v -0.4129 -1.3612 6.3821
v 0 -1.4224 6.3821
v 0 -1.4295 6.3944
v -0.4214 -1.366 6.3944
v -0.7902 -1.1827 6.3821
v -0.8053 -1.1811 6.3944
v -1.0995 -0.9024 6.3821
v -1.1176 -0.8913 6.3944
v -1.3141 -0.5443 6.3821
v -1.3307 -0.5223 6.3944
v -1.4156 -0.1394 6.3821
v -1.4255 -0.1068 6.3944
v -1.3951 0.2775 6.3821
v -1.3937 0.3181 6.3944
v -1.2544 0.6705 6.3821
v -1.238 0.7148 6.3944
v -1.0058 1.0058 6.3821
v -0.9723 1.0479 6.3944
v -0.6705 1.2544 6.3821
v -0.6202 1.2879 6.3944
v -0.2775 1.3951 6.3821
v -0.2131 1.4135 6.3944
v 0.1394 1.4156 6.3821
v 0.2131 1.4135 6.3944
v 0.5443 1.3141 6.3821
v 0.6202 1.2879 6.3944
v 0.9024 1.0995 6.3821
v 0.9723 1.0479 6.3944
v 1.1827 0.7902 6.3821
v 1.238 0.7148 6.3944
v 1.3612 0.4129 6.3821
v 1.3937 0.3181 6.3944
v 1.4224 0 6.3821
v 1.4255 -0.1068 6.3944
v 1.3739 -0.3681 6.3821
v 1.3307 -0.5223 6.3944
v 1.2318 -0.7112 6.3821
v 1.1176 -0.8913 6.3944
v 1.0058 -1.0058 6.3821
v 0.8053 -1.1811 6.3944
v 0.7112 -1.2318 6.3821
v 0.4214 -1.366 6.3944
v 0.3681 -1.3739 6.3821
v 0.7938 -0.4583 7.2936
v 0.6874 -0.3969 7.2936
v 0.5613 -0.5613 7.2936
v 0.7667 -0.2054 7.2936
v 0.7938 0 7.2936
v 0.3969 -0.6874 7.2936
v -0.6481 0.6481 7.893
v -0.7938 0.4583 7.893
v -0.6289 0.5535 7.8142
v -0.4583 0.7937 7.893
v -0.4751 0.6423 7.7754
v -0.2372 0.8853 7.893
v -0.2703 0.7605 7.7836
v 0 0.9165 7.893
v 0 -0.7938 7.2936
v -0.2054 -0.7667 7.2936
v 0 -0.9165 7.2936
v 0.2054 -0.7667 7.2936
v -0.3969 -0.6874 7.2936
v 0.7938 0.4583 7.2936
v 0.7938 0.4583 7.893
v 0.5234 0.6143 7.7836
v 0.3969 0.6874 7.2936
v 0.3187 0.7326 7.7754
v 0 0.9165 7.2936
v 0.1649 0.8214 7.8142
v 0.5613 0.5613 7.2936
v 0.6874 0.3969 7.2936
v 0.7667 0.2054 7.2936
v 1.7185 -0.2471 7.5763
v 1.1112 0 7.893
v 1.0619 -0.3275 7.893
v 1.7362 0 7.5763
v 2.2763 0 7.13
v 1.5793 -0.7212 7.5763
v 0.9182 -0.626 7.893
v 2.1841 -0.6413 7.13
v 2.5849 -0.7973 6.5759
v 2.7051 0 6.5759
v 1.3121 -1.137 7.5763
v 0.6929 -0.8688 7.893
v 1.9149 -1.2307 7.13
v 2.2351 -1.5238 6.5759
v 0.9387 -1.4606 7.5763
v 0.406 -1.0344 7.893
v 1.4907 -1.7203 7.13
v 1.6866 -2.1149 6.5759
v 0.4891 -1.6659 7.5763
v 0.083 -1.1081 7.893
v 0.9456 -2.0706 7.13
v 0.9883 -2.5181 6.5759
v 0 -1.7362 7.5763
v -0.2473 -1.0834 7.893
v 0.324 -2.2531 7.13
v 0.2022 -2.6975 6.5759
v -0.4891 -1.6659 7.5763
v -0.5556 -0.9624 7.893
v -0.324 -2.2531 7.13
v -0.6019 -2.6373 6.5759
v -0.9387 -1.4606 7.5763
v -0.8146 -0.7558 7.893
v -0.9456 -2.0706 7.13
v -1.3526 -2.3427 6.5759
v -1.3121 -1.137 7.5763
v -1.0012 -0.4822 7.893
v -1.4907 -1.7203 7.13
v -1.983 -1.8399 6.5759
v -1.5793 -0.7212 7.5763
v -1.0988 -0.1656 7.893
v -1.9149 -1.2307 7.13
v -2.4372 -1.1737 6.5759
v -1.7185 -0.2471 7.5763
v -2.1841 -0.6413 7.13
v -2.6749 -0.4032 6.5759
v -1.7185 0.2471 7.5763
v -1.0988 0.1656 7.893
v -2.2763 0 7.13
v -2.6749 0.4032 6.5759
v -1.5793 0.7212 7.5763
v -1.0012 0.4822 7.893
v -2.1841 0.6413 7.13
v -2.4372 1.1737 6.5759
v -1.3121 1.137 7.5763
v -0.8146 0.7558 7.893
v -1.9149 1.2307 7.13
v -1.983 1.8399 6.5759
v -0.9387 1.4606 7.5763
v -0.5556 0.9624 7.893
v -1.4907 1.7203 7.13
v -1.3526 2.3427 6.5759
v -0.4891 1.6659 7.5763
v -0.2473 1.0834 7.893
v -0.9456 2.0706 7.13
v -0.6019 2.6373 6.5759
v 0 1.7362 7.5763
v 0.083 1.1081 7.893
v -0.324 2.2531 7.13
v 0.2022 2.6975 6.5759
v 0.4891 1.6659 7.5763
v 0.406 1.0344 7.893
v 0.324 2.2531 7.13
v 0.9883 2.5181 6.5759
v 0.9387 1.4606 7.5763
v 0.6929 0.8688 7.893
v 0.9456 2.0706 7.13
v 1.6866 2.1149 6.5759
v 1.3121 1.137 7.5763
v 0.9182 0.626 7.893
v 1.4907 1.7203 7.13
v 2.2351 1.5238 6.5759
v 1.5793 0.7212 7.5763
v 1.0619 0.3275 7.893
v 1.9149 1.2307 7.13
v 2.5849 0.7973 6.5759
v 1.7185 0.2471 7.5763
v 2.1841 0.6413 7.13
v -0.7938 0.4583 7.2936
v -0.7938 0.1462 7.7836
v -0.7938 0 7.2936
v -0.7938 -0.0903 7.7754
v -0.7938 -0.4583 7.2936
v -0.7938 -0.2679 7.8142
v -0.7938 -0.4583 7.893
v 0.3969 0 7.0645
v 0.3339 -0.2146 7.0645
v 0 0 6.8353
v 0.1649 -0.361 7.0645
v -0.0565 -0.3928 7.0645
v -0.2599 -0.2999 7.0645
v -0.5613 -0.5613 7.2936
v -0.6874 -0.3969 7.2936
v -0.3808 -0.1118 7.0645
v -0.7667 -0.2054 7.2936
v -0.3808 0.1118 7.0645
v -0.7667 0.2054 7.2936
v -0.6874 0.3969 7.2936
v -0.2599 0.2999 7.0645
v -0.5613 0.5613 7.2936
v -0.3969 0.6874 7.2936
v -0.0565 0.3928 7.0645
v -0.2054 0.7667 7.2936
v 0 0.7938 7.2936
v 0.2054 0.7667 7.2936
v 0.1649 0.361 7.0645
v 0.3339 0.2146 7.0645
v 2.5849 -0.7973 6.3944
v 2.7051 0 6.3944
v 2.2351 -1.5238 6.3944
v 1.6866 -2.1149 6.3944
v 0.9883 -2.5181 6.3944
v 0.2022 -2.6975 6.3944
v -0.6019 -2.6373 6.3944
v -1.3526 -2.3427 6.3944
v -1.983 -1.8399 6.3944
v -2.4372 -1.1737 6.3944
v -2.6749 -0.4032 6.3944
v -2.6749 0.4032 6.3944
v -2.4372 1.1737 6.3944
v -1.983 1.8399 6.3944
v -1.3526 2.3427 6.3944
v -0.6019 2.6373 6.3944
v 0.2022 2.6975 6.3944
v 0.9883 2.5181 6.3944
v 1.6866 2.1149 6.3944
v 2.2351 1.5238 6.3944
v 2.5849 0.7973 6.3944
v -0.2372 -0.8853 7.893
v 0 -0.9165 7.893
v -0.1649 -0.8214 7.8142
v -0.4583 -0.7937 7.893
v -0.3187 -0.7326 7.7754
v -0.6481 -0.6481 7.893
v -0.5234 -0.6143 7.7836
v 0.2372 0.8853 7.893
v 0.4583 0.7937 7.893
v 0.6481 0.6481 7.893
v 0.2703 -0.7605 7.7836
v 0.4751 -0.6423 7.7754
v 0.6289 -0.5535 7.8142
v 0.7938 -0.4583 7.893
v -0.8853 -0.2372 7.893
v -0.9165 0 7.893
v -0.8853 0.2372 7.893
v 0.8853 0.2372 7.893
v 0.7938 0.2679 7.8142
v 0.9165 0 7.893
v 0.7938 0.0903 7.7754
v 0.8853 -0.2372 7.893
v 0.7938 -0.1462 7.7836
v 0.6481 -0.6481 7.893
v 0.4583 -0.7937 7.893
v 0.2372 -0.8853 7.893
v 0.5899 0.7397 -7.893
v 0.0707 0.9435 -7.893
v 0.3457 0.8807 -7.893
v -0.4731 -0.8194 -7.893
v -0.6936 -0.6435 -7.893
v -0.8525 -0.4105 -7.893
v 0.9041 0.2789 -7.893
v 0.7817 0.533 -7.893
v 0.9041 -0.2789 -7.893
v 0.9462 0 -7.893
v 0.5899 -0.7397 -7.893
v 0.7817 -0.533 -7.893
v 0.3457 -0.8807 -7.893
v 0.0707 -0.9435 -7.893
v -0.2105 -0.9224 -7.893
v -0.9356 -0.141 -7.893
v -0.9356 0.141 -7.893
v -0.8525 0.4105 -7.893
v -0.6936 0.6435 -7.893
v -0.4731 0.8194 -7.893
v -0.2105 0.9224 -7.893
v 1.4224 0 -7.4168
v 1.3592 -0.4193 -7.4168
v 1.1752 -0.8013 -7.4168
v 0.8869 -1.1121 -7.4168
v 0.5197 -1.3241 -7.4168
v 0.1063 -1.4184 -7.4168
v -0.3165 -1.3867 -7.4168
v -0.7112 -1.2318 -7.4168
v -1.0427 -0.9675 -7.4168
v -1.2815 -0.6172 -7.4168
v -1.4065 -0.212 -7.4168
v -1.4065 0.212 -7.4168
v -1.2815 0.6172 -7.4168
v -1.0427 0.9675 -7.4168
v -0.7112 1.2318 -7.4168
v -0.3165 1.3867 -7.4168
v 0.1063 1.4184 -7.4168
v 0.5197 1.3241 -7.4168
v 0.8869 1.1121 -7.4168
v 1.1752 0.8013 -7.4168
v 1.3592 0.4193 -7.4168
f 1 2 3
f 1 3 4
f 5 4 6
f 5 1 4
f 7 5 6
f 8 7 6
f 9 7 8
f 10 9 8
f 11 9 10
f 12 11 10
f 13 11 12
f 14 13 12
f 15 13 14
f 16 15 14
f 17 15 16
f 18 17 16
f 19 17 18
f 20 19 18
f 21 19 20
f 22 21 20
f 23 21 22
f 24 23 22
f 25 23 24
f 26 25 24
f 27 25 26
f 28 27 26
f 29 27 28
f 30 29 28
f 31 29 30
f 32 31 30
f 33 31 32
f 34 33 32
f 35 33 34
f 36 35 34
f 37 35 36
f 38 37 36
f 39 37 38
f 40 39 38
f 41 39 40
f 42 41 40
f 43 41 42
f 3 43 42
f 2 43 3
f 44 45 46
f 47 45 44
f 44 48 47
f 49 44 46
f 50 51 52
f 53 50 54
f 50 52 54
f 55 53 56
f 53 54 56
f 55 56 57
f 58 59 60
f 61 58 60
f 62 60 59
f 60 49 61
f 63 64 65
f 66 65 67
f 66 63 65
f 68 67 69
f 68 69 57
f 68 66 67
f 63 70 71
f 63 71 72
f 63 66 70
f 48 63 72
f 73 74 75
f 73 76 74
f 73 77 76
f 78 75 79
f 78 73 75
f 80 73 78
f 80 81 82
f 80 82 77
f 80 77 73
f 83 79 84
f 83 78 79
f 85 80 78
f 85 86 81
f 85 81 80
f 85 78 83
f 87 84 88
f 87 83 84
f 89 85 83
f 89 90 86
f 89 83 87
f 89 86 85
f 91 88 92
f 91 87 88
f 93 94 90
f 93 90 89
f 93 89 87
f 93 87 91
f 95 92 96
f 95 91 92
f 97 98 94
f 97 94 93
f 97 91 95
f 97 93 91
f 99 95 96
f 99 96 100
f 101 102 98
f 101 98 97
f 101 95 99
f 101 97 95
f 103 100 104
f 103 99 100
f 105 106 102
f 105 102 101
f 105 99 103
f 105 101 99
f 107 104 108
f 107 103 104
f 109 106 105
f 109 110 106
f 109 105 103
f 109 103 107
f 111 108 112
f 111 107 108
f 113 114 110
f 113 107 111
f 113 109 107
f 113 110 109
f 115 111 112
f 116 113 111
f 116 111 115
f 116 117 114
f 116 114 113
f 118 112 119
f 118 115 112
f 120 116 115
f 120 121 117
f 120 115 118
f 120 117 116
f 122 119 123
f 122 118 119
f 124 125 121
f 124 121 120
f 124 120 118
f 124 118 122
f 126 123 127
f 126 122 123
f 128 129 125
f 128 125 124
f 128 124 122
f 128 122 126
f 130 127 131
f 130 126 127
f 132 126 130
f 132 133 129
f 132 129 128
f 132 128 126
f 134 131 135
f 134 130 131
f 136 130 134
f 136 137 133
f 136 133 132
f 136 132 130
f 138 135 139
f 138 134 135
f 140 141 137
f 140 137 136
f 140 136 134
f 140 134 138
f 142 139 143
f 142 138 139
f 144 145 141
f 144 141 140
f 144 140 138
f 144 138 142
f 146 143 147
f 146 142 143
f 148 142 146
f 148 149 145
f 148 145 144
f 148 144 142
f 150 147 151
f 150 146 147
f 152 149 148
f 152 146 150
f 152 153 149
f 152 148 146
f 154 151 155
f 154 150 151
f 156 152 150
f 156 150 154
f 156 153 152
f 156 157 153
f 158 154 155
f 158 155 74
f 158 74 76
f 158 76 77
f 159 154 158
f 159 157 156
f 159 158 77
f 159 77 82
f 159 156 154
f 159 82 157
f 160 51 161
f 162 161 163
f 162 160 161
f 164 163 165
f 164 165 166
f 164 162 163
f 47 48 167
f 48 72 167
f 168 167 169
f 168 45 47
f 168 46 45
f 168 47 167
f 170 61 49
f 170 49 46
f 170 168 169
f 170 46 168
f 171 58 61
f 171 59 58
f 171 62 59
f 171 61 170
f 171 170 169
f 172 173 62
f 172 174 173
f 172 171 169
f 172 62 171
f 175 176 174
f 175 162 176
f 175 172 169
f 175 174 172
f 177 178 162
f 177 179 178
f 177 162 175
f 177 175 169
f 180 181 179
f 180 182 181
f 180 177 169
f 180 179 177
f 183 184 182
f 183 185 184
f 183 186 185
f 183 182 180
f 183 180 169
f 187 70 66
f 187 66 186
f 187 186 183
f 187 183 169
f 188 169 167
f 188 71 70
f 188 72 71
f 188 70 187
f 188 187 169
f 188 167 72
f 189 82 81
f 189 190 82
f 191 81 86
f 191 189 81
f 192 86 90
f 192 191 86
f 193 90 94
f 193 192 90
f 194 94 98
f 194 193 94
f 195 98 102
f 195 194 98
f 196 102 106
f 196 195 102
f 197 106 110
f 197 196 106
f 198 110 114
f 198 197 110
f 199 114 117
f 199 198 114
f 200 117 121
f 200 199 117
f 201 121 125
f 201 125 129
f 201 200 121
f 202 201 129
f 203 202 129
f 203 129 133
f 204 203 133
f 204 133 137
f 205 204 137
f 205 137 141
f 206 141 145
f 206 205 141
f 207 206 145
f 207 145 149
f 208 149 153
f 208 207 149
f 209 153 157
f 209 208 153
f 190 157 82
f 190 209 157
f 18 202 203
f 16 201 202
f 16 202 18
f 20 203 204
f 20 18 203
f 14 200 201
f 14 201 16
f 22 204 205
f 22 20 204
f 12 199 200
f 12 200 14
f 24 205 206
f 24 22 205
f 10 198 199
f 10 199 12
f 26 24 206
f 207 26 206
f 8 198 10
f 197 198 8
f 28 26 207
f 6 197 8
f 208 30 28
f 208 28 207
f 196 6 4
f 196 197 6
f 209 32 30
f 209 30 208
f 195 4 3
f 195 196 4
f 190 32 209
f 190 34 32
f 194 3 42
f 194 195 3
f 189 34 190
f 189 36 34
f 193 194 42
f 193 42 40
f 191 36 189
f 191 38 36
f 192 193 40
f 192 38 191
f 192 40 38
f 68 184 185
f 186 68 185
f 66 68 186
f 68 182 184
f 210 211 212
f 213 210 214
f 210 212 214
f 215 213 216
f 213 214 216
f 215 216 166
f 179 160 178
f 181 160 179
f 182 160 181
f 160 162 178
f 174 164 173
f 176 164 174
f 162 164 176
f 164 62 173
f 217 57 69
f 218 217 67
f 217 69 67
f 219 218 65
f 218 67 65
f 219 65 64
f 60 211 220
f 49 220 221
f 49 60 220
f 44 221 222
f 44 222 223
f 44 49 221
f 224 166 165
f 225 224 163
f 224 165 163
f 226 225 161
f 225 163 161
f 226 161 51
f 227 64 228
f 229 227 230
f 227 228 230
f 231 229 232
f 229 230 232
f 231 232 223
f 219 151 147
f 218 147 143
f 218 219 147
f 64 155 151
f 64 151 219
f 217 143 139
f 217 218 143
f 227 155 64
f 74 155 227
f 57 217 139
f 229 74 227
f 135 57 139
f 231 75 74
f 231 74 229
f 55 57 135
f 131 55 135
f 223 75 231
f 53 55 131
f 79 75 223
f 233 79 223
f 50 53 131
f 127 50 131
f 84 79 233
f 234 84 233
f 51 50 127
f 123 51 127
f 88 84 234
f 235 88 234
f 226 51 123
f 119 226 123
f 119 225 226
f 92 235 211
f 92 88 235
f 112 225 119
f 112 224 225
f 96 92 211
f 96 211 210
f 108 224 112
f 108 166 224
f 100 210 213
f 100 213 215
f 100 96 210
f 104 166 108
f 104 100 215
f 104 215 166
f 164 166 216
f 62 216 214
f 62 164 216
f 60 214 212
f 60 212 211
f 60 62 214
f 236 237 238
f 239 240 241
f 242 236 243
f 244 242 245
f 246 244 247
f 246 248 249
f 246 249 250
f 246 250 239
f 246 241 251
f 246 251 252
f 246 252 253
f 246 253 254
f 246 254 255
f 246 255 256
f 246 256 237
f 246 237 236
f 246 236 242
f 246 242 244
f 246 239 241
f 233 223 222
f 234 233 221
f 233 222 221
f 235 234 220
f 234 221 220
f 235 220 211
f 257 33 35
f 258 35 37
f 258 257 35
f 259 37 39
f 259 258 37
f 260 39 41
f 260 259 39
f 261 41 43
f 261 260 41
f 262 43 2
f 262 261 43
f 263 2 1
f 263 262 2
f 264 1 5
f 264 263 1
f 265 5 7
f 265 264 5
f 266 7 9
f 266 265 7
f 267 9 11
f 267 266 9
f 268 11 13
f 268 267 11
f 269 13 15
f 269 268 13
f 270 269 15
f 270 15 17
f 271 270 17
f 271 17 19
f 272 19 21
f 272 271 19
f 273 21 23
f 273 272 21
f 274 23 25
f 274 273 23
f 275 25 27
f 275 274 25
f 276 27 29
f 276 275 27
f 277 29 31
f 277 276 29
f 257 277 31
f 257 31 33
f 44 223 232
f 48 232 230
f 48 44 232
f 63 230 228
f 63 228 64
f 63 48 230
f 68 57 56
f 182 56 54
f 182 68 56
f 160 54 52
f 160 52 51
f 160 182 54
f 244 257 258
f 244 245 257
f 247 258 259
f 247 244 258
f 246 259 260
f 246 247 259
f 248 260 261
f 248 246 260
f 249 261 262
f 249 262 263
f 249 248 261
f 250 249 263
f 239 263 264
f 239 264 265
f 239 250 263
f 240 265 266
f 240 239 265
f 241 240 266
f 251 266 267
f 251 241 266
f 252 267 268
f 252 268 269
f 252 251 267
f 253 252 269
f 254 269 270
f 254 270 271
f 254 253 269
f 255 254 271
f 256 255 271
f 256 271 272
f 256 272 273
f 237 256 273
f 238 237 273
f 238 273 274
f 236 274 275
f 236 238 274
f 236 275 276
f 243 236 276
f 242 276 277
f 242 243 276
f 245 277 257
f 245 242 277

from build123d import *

# Parameters (mm, degrees)
CUT_EXTRUDE1_START = 7.29361
CUT_EXTRUDE1_DEPTH = 2.477670997


# Read off the part's stored shape, not the designer's step: Split1
with BuildPart() as part:
    # Sketch2 → Revolve1 (revolve)
    with BuildSketch(Plane(origin=(0, 0, 0), x_dir=(0, 0, -1), z_dir=(1, 0, 0)), mode=Mode.PRIVATE) as revolve1_sk:
        with BuildLine():
            Line((-7.89305, 0.79375), (-7.89305, 1.11125))
            ThreePointArc((-7.89305, 1.11125), (-7.36812089, 2.018629974), (-6.575878571, 2.7051))
            Line((-6.575878571, 2.7051), (-6.39445, 2.7051))
            Line((-6.39445, 2.7051), (-6.39445, 1.4224))
            Line((-6.39445, 1.4224), (7.4168, 1.4224))
            Line((7.4168, 1.4224), (7.89305, 0.94615))
            Line((7.89305, 0.94615), (7.89305, 0))
            Line((7.89305, 0), (-6.835338224, 0))
            Line((-6.835338224, 0), (-7.29361, 0.79375))
            Line((-7.29361, 0.79375), (-7.89305, 0.79375))
        make_face()
    revolve(revolve1_sk.sketch.rotate(Axis((0, 0, 7.89305), (0, 0, -1)), 90), axis=Axis((0, 0, 7.89305), (0, 0, -1)))

    # Sketch3 → Cut-Extrude1 (cut, through all)
    with BuildSketch(Plane.XY.offset(CUT_EXTRUDE1_START)):
        Polygon((0, 0.916543552), (-0.79375, 0.458271776), (-0.79375, -0.458271776), (0, -0.916543552), (0.79375, -0.458271776), (0.79375, 0.458271776), align=None)
    extrude(amount=CUT_EXTRUDE1_DEPTH, mode=Mode.SUBTRACT)

    # Cut-Extrude2 cone 1 section (through the dimple's axis) → Cut-Extrude2 (revolve, cut)
    with BuildSketch(Plane(origin=(0, 0, 7.89305), x_dir=(0, -1, 0), z_dir=(1, 0, 0))):
        Polygon((0, 0), (0.916543552, 0), (0, 0.916543552), align=None)
    revolve(axis=Axis((0, 0, 7.89305), (0, 0, -1)), mode=Mode.SUBTRACT)


with BuildPart() as body_2:
    # Split1: the piece on the far side of the plane
    add(part.part)
    split(bisect_by=Plane.XY.offset(6.39445), keep=Keep.BOTTOM)


with BuildPart() as part_1:
    add(part.part)

    # Split1
    split(bisect_by=Plane.XY.offset(6.39445), keep=Keep.TOP)

    add(body_2.part)  # Boss-Extrude1 merges body 2
    # Boss-Extrude1 cone 1 section (through the dimple's axis) → Boss-Extrude1 (revolve)
    with BuildSketch(Plane(origin=(0, 0, 6.39445), x_dir=(0, -1, 0), z_dir=(1, 0, 0))):
        Polygon((0, 0), (1.429512, 0), (0, 2.475987414), align=None)
    revolve(axis=Axis((0, 0, 6.39445), (0, 0, -1)))


solid = part_1.part
